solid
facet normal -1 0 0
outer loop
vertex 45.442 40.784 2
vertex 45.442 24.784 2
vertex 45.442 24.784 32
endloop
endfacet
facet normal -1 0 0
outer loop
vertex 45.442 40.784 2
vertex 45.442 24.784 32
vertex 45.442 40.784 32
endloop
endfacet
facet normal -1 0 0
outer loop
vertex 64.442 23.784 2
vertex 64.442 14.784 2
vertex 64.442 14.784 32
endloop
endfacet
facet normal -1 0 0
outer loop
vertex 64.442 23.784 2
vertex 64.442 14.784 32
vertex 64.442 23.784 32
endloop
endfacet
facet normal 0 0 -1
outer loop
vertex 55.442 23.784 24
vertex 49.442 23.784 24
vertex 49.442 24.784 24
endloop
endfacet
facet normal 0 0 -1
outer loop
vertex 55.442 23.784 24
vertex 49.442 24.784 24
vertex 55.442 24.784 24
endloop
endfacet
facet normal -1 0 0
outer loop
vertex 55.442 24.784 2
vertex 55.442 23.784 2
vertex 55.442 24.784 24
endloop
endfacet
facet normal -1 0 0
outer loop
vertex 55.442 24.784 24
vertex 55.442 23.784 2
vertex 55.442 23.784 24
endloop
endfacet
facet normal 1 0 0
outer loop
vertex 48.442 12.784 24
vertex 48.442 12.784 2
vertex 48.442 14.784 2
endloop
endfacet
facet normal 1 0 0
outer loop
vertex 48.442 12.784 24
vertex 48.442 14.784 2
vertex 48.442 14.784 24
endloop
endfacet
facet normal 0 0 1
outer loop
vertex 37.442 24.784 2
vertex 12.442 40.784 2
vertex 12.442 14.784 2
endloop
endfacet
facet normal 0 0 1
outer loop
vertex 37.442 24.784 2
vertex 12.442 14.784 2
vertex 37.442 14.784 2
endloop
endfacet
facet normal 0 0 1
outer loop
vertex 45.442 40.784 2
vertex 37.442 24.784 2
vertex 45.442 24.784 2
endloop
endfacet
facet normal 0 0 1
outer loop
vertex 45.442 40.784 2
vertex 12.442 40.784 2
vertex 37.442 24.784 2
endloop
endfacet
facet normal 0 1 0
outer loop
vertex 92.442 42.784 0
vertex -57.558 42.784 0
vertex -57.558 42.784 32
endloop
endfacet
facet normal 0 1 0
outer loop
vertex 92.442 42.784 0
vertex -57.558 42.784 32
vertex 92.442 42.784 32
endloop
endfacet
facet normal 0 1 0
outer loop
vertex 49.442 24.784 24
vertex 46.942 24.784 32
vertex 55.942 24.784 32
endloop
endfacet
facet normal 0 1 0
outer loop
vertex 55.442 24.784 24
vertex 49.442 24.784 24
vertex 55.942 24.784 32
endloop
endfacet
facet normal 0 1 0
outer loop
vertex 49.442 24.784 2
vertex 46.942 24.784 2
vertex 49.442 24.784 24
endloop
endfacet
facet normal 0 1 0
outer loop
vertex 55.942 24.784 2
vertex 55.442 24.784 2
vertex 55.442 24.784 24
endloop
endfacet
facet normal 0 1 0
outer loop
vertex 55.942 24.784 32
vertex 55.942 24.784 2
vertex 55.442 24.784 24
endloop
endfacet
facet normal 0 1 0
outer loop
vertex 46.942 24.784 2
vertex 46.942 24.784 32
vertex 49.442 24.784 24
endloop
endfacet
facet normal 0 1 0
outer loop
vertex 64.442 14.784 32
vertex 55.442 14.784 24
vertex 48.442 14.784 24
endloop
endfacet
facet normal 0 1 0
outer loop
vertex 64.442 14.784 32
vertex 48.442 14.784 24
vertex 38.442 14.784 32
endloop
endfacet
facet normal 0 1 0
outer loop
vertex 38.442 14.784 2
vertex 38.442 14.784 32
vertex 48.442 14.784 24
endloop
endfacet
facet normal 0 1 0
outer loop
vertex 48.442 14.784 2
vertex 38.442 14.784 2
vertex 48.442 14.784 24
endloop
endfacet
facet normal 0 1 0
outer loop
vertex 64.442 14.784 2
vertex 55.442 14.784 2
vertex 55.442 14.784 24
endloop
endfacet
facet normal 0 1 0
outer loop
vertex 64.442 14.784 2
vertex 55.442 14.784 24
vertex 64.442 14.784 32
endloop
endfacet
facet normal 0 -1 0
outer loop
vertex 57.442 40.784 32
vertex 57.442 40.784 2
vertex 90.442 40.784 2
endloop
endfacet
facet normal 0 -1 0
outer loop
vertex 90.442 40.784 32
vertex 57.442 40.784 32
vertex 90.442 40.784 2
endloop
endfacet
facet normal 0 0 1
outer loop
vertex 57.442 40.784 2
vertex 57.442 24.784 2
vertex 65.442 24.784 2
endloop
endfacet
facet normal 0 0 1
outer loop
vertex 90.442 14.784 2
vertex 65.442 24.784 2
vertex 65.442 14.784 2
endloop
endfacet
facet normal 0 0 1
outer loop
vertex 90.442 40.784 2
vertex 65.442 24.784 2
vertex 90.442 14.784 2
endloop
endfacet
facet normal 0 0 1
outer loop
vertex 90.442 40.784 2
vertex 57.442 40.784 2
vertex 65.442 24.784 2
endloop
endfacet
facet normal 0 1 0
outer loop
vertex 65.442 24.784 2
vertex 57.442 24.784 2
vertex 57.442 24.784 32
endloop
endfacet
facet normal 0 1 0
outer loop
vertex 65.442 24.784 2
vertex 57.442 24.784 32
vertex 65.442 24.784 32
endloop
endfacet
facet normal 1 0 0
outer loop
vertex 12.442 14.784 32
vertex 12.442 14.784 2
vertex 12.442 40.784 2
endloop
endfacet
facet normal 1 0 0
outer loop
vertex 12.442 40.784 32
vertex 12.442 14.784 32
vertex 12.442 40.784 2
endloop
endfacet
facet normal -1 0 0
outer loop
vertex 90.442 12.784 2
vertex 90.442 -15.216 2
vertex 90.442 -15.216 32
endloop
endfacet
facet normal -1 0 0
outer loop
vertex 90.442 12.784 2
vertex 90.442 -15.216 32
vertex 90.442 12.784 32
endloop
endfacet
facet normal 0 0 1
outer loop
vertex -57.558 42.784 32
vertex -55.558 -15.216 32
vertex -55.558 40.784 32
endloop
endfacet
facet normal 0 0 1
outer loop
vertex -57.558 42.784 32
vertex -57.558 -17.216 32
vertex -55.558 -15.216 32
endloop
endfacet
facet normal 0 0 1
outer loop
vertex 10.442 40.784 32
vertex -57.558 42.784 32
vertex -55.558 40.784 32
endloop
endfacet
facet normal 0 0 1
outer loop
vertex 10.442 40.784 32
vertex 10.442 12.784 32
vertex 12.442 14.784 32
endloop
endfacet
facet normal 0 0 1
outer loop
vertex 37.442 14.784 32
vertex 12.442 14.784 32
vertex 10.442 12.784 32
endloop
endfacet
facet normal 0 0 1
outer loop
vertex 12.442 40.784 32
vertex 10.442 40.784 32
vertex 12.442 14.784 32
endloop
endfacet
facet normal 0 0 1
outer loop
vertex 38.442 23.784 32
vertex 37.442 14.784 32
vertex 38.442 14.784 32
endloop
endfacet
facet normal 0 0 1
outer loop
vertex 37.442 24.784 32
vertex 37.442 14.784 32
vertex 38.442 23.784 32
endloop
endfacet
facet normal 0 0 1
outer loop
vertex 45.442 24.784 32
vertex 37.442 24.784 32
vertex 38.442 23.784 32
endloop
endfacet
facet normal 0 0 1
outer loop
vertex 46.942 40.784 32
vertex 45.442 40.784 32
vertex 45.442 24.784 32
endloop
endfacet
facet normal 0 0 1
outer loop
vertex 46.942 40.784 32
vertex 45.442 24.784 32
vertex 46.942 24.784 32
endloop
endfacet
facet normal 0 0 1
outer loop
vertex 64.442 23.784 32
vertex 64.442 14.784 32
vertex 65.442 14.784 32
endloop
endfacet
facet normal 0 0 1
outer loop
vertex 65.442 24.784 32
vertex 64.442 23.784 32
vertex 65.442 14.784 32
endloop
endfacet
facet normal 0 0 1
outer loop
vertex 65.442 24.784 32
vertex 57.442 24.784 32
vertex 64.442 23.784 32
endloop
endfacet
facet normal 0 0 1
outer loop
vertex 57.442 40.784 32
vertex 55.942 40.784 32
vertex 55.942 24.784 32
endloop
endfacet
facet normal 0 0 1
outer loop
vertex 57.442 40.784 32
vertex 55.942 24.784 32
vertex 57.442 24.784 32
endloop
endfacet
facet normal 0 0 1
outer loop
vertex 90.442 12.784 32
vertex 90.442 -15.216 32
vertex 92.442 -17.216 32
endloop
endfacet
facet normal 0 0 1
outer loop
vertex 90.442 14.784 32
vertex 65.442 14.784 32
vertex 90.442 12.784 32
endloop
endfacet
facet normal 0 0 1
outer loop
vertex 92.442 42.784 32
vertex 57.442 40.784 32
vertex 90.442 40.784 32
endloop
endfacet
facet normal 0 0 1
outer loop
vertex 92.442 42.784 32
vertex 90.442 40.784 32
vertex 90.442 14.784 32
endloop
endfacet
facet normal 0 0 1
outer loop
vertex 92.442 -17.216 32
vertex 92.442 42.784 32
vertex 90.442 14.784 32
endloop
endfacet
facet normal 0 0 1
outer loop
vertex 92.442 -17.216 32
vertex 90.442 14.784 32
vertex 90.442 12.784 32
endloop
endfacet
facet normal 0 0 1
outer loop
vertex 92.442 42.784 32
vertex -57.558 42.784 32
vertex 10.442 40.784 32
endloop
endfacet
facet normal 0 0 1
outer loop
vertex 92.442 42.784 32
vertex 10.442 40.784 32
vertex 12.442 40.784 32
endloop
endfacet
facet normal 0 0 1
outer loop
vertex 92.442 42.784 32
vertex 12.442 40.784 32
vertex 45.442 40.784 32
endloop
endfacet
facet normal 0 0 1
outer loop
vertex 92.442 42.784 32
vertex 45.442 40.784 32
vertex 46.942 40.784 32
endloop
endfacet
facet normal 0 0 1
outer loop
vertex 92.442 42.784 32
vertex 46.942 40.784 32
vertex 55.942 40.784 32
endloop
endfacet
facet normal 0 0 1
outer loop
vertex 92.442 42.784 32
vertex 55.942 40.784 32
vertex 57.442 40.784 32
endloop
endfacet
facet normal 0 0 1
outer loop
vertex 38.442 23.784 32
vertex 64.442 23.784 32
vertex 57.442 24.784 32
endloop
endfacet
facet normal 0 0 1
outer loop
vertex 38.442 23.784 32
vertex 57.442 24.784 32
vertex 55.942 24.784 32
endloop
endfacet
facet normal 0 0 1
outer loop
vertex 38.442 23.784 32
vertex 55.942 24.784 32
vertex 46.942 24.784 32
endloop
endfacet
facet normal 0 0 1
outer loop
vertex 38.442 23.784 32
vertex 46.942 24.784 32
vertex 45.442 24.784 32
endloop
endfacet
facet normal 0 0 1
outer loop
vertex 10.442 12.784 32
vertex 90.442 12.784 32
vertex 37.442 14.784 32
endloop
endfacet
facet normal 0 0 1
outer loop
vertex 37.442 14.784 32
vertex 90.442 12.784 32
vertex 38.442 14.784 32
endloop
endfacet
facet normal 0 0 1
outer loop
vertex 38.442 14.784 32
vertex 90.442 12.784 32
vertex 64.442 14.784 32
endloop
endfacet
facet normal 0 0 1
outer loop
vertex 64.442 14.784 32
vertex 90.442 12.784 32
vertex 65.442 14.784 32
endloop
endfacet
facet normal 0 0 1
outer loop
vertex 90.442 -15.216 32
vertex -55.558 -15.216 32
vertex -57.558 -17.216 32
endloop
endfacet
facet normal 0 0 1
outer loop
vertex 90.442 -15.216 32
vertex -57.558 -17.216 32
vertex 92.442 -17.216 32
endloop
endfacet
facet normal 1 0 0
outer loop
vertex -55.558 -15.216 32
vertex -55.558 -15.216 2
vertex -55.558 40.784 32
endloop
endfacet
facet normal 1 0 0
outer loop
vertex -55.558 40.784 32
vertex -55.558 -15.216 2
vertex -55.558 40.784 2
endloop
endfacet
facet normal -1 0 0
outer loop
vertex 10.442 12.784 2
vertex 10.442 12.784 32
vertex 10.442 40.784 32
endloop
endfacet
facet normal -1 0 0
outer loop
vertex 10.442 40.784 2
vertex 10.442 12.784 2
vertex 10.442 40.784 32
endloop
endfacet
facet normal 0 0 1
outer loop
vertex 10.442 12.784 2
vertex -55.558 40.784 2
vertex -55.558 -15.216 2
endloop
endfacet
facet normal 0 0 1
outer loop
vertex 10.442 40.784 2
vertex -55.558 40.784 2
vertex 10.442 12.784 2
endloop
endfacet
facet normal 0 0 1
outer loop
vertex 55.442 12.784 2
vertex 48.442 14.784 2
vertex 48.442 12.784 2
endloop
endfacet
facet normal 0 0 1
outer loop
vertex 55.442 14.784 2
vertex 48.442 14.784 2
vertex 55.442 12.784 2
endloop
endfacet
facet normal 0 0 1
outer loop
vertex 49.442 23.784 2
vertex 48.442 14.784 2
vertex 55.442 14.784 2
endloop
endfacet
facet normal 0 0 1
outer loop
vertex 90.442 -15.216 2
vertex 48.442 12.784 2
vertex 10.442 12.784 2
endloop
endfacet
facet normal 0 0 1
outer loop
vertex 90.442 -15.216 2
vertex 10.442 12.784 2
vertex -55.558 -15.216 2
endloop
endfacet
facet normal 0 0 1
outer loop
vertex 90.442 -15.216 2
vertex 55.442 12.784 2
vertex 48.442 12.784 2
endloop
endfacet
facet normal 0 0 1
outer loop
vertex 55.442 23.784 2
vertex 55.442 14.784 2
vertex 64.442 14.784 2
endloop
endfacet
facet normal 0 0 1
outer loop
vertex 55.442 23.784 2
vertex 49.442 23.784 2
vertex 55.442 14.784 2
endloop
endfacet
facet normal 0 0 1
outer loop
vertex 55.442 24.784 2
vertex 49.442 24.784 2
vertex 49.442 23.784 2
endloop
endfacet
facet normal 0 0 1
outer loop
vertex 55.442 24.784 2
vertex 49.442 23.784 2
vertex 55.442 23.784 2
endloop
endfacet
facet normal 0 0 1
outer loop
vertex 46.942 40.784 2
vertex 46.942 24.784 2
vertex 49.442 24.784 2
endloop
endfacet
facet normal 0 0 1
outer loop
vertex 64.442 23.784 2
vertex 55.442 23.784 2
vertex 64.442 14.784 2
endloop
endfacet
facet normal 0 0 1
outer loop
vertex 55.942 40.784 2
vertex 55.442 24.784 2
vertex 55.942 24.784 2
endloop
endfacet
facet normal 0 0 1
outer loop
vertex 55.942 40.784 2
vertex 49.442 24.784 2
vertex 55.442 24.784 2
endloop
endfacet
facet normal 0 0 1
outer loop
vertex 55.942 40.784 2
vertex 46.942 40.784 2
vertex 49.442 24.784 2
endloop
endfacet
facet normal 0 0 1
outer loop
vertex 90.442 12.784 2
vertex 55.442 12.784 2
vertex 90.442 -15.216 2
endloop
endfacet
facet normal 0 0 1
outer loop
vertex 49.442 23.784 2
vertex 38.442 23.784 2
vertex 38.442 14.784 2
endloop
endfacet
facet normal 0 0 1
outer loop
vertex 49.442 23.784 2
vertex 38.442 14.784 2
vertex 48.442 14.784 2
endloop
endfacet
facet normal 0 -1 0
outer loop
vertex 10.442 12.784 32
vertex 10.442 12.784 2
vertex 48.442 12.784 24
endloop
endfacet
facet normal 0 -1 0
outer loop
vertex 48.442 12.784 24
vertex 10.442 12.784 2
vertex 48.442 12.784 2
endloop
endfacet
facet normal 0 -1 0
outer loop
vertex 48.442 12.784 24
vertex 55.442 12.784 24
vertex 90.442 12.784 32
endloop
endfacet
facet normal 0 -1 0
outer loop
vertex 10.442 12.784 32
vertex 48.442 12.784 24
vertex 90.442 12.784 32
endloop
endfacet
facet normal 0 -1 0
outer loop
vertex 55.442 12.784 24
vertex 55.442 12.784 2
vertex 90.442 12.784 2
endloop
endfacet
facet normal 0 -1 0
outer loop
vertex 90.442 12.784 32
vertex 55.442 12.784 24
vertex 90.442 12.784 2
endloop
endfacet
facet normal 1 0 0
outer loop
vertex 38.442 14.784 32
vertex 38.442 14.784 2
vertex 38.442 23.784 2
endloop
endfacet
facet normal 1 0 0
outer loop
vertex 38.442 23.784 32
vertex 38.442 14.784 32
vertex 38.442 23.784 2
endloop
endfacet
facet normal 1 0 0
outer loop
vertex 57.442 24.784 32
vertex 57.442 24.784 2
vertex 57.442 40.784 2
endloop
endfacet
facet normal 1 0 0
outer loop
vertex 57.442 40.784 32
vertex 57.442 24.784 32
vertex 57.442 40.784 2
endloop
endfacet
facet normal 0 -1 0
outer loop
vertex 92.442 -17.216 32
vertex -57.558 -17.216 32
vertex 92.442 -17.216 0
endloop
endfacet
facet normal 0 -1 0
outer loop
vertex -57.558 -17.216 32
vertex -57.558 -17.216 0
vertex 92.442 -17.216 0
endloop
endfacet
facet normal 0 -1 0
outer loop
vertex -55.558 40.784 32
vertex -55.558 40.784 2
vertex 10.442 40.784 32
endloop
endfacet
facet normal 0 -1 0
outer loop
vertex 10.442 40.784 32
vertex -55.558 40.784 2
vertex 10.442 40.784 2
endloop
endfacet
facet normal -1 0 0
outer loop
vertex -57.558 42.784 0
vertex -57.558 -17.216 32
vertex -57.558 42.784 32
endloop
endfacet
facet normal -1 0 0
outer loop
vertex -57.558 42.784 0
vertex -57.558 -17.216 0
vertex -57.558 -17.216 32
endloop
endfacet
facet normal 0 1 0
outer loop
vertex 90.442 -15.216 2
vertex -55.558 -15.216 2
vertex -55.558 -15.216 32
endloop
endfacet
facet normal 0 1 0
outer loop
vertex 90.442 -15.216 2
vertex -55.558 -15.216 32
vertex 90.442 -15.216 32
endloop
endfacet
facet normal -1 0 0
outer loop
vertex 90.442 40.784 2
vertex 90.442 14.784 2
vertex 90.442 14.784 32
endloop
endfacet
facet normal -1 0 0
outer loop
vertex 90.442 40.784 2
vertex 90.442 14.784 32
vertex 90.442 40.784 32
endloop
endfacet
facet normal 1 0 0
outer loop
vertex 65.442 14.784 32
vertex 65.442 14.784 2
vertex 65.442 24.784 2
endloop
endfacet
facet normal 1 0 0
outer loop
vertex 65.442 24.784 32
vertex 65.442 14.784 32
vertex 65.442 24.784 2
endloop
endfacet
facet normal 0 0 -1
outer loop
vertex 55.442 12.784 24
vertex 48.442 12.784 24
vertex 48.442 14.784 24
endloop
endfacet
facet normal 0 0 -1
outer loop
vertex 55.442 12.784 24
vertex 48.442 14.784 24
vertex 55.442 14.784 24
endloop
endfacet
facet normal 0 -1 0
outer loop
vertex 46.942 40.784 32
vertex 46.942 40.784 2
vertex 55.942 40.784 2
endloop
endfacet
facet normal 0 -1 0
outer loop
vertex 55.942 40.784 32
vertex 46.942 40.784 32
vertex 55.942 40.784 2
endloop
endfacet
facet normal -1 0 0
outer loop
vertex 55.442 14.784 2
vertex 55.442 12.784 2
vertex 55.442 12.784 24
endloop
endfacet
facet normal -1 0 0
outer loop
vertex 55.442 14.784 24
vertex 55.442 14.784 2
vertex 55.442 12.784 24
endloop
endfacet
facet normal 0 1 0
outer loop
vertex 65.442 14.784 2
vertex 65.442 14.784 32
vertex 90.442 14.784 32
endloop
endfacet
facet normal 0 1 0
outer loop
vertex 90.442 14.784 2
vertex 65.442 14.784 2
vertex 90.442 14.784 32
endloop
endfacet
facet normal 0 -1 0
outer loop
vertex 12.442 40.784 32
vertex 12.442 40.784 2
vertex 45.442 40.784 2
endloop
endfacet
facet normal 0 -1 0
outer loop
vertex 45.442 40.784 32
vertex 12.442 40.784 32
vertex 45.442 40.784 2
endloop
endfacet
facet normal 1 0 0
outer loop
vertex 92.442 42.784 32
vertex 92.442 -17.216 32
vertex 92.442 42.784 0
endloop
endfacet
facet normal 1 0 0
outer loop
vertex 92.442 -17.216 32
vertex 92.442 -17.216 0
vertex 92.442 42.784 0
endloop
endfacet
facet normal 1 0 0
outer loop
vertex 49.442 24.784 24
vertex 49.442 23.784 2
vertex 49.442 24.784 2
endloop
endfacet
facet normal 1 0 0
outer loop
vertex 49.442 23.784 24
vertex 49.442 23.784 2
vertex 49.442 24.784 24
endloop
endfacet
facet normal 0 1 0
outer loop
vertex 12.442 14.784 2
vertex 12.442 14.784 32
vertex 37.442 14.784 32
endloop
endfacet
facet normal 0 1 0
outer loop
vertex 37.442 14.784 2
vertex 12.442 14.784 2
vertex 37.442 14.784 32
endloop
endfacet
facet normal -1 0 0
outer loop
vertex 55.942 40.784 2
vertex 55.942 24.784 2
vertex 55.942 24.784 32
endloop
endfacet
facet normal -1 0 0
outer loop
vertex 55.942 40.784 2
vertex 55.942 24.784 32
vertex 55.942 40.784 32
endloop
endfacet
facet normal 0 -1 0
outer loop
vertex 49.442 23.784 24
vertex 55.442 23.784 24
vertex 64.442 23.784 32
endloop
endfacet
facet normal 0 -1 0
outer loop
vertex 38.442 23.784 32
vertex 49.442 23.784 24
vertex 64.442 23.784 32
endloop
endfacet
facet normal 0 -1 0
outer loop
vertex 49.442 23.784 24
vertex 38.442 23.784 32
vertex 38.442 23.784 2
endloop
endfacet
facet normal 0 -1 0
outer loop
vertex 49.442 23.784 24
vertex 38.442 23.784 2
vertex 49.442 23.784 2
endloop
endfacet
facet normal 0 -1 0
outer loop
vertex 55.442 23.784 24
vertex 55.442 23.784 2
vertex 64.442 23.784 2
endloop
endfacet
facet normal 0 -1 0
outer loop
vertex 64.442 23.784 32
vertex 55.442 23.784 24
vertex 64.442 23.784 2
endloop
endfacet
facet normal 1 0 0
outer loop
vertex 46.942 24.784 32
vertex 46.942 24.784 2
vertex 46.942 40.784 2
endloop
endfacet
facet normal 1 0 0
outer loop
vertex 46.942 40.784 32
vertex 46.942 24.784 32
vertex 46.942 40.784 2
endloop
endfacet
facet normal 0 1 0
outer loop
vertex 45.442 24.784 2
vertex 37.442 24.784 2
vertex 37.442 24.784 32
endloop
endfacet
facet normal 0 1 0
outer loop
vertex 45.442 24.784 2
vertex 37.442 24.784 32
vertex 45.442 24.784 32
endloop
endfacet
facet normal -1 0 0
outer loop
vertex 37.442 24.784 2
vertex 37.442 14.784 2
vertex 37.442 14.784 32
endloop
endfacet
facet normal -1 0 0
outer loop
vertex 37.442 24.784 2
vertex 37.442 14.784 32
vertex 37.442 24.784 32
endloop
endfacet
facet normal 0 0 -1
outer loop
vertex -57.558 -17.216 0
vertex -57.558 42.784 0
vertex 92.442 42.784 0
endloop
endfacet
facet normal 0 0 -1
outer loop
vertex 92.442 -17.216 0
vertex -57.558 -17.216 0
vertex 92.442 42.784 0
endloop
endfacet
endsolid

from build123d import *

# Parameters (mm, degrees)
F0_W      = 150
F0_H      = 60
F1_DEPTH  = 2
F2_W      = 2
F2_H      = 60
F3_DEPTH  = 30
F4_W      = 148
F4_H      = 2
F5_DEPTH  = 30
F6_W      = 2
F6_H      = 58
F7_DEPTH  = 30
F8_W      = 146
F8_H      = 2
F9_DEPTH  = 30
F11_W     = 2
F11_H     = 28
F12_DEPTH = 30
F13_W     = 80
F13_H     = 2
F14_DEPTH = 30
F16_W     = 1
F16_H     = 10
F17_DEPTH = 30
F18_W     = 28
F18_H     = 1
F19_DEPTH = 30
F20_W     = 1
F20_H     = 10
F21_DEPTH = 30
F22_W     = 1.5
F22_H     = 16
F23_DEPTH = 30
F24_W     = 1.5
F24_H     = 16
F25_DEPTH = 30
F26_W     = 7
F26_H     = 22
F27_DEPTH = 3
F28_W     = 6
F28_H     = 22
F29_DEPTH = 2


with BuildPart() as f1:
    # F0 (on Top) → F1 (new body)
    with BuildSketch(Plane.XY):
        with Locations((17.442032, 12.783553)):
            Rectangle(F0_W, F0_H)
    extrude(amount=F1_DEPTH)

    # F2 (on face) → F3 (join)
    with BuildSketch(Plane.XY.offset(2)):
        with Locations((-56.557968, 12.783553)):
            Rectangle(F2_W, F2_H)
    extrude(amount=F3_DEPTH)

    # F4 (on face) → F5 (join)
    with BuildSketch(Plane.XY.offset(2)):
        with Locations((18.442032, 41.783553)):
            Rectangle(F4_W, F4_H)
    extrude(amount=F5_DEPTH)

    # F6 (on face) → F7 (join)
    with BuildSketch(Plane.XY.offset(2)):
        with Locations((91.442032, 11.783553)):
            Rectangle(F6_W, F6_H)
    extrude(amount=F7_DEPTH)

    # F8 (on face) → F9 (join)
    with BuildSketch(Plane.XY.offset(2)):
        with Locations((17.442032, -16.216447)):
            Rectangle(F8_W, F8_H)
    extrude(amount=F9_DEPTH)

    # F11 (on face) → F12 (join)
    with BuildSketch(Plane.XY.offset(2)):
        with Locations((11.442032, 26.783553)):
            Rectangle(F11_W, F11_H)
    extrude(amount=F12_DEPTH)

    # F13 (on face) → F14 (join)
    with BuildSketch(Plane.XY.offset(2)):
        with Locations((50.442032, 13.783553)):
            Rectangle(F13_W, F13_H)
    extrude(amount=F14_DEPTH)

    # F16 (on face) → F17 (join)
    with BuildSketch(Plane.XY.offset(2)):
        with Locations((37.942032, 19.783553)):
            Rectangle(F16_W, F16_H)
    extrude(amount=F17_DEPTH)

    # F18 (on face) → F19 (join)
    with BuildSketch(Plane.XY.offset(2)):
        with Locations((51.442032, 24.283553)):
            Rectangle(F18_W, F18_H)
    extrude(amount=F19_DEPTH)

    # F20 (on face) → F21 (join)
    with BuildSketch(Plane.XY.offset(2)):
        with Locations((64.942032, 19.783553)):
            Rectangle(F20_W, F20_H)
    extrude(amount=F21_DEPTH)

    # F22 (on face) → F23 (join)
    with BuildSketch(Plane.XY.offset(2)):
        with Locations((46.192032, 32.783553)):
            Rectangle(F22_W, F22_H)
    extrude(amount=F23_DEPTH)

    # F24 (on face) → F25 (join)
    with BuildSketch(Plane.XY.offset(2)):
        with Locations((56.692032, 32.783553)):
            Rectangle(F24_W, F24_H)
    extrude(amount=F25_DEPTH)

    # F26 (on face) → F27 (cut)
    with BuildSketch(Plane.XZ.offset(-12.783553)):
        with Locations((51.942032, 13)):
            Rectangle(F26_W, F26_H)
    extrude(amount=-F27_DEPTH, mode=Mode.SUBTRACT)

    # F28 (on face) → F29 (cut)
    with BuildSketch(Plane.XZ.offset(-23.783553)):
        with Locations((52.442032, 13)):
            Rectangle(F28_W, F28_H)
    extrude(amount=-F29_DEPTH, mode=Mode.SUBTRACT)


solid = f1.part
